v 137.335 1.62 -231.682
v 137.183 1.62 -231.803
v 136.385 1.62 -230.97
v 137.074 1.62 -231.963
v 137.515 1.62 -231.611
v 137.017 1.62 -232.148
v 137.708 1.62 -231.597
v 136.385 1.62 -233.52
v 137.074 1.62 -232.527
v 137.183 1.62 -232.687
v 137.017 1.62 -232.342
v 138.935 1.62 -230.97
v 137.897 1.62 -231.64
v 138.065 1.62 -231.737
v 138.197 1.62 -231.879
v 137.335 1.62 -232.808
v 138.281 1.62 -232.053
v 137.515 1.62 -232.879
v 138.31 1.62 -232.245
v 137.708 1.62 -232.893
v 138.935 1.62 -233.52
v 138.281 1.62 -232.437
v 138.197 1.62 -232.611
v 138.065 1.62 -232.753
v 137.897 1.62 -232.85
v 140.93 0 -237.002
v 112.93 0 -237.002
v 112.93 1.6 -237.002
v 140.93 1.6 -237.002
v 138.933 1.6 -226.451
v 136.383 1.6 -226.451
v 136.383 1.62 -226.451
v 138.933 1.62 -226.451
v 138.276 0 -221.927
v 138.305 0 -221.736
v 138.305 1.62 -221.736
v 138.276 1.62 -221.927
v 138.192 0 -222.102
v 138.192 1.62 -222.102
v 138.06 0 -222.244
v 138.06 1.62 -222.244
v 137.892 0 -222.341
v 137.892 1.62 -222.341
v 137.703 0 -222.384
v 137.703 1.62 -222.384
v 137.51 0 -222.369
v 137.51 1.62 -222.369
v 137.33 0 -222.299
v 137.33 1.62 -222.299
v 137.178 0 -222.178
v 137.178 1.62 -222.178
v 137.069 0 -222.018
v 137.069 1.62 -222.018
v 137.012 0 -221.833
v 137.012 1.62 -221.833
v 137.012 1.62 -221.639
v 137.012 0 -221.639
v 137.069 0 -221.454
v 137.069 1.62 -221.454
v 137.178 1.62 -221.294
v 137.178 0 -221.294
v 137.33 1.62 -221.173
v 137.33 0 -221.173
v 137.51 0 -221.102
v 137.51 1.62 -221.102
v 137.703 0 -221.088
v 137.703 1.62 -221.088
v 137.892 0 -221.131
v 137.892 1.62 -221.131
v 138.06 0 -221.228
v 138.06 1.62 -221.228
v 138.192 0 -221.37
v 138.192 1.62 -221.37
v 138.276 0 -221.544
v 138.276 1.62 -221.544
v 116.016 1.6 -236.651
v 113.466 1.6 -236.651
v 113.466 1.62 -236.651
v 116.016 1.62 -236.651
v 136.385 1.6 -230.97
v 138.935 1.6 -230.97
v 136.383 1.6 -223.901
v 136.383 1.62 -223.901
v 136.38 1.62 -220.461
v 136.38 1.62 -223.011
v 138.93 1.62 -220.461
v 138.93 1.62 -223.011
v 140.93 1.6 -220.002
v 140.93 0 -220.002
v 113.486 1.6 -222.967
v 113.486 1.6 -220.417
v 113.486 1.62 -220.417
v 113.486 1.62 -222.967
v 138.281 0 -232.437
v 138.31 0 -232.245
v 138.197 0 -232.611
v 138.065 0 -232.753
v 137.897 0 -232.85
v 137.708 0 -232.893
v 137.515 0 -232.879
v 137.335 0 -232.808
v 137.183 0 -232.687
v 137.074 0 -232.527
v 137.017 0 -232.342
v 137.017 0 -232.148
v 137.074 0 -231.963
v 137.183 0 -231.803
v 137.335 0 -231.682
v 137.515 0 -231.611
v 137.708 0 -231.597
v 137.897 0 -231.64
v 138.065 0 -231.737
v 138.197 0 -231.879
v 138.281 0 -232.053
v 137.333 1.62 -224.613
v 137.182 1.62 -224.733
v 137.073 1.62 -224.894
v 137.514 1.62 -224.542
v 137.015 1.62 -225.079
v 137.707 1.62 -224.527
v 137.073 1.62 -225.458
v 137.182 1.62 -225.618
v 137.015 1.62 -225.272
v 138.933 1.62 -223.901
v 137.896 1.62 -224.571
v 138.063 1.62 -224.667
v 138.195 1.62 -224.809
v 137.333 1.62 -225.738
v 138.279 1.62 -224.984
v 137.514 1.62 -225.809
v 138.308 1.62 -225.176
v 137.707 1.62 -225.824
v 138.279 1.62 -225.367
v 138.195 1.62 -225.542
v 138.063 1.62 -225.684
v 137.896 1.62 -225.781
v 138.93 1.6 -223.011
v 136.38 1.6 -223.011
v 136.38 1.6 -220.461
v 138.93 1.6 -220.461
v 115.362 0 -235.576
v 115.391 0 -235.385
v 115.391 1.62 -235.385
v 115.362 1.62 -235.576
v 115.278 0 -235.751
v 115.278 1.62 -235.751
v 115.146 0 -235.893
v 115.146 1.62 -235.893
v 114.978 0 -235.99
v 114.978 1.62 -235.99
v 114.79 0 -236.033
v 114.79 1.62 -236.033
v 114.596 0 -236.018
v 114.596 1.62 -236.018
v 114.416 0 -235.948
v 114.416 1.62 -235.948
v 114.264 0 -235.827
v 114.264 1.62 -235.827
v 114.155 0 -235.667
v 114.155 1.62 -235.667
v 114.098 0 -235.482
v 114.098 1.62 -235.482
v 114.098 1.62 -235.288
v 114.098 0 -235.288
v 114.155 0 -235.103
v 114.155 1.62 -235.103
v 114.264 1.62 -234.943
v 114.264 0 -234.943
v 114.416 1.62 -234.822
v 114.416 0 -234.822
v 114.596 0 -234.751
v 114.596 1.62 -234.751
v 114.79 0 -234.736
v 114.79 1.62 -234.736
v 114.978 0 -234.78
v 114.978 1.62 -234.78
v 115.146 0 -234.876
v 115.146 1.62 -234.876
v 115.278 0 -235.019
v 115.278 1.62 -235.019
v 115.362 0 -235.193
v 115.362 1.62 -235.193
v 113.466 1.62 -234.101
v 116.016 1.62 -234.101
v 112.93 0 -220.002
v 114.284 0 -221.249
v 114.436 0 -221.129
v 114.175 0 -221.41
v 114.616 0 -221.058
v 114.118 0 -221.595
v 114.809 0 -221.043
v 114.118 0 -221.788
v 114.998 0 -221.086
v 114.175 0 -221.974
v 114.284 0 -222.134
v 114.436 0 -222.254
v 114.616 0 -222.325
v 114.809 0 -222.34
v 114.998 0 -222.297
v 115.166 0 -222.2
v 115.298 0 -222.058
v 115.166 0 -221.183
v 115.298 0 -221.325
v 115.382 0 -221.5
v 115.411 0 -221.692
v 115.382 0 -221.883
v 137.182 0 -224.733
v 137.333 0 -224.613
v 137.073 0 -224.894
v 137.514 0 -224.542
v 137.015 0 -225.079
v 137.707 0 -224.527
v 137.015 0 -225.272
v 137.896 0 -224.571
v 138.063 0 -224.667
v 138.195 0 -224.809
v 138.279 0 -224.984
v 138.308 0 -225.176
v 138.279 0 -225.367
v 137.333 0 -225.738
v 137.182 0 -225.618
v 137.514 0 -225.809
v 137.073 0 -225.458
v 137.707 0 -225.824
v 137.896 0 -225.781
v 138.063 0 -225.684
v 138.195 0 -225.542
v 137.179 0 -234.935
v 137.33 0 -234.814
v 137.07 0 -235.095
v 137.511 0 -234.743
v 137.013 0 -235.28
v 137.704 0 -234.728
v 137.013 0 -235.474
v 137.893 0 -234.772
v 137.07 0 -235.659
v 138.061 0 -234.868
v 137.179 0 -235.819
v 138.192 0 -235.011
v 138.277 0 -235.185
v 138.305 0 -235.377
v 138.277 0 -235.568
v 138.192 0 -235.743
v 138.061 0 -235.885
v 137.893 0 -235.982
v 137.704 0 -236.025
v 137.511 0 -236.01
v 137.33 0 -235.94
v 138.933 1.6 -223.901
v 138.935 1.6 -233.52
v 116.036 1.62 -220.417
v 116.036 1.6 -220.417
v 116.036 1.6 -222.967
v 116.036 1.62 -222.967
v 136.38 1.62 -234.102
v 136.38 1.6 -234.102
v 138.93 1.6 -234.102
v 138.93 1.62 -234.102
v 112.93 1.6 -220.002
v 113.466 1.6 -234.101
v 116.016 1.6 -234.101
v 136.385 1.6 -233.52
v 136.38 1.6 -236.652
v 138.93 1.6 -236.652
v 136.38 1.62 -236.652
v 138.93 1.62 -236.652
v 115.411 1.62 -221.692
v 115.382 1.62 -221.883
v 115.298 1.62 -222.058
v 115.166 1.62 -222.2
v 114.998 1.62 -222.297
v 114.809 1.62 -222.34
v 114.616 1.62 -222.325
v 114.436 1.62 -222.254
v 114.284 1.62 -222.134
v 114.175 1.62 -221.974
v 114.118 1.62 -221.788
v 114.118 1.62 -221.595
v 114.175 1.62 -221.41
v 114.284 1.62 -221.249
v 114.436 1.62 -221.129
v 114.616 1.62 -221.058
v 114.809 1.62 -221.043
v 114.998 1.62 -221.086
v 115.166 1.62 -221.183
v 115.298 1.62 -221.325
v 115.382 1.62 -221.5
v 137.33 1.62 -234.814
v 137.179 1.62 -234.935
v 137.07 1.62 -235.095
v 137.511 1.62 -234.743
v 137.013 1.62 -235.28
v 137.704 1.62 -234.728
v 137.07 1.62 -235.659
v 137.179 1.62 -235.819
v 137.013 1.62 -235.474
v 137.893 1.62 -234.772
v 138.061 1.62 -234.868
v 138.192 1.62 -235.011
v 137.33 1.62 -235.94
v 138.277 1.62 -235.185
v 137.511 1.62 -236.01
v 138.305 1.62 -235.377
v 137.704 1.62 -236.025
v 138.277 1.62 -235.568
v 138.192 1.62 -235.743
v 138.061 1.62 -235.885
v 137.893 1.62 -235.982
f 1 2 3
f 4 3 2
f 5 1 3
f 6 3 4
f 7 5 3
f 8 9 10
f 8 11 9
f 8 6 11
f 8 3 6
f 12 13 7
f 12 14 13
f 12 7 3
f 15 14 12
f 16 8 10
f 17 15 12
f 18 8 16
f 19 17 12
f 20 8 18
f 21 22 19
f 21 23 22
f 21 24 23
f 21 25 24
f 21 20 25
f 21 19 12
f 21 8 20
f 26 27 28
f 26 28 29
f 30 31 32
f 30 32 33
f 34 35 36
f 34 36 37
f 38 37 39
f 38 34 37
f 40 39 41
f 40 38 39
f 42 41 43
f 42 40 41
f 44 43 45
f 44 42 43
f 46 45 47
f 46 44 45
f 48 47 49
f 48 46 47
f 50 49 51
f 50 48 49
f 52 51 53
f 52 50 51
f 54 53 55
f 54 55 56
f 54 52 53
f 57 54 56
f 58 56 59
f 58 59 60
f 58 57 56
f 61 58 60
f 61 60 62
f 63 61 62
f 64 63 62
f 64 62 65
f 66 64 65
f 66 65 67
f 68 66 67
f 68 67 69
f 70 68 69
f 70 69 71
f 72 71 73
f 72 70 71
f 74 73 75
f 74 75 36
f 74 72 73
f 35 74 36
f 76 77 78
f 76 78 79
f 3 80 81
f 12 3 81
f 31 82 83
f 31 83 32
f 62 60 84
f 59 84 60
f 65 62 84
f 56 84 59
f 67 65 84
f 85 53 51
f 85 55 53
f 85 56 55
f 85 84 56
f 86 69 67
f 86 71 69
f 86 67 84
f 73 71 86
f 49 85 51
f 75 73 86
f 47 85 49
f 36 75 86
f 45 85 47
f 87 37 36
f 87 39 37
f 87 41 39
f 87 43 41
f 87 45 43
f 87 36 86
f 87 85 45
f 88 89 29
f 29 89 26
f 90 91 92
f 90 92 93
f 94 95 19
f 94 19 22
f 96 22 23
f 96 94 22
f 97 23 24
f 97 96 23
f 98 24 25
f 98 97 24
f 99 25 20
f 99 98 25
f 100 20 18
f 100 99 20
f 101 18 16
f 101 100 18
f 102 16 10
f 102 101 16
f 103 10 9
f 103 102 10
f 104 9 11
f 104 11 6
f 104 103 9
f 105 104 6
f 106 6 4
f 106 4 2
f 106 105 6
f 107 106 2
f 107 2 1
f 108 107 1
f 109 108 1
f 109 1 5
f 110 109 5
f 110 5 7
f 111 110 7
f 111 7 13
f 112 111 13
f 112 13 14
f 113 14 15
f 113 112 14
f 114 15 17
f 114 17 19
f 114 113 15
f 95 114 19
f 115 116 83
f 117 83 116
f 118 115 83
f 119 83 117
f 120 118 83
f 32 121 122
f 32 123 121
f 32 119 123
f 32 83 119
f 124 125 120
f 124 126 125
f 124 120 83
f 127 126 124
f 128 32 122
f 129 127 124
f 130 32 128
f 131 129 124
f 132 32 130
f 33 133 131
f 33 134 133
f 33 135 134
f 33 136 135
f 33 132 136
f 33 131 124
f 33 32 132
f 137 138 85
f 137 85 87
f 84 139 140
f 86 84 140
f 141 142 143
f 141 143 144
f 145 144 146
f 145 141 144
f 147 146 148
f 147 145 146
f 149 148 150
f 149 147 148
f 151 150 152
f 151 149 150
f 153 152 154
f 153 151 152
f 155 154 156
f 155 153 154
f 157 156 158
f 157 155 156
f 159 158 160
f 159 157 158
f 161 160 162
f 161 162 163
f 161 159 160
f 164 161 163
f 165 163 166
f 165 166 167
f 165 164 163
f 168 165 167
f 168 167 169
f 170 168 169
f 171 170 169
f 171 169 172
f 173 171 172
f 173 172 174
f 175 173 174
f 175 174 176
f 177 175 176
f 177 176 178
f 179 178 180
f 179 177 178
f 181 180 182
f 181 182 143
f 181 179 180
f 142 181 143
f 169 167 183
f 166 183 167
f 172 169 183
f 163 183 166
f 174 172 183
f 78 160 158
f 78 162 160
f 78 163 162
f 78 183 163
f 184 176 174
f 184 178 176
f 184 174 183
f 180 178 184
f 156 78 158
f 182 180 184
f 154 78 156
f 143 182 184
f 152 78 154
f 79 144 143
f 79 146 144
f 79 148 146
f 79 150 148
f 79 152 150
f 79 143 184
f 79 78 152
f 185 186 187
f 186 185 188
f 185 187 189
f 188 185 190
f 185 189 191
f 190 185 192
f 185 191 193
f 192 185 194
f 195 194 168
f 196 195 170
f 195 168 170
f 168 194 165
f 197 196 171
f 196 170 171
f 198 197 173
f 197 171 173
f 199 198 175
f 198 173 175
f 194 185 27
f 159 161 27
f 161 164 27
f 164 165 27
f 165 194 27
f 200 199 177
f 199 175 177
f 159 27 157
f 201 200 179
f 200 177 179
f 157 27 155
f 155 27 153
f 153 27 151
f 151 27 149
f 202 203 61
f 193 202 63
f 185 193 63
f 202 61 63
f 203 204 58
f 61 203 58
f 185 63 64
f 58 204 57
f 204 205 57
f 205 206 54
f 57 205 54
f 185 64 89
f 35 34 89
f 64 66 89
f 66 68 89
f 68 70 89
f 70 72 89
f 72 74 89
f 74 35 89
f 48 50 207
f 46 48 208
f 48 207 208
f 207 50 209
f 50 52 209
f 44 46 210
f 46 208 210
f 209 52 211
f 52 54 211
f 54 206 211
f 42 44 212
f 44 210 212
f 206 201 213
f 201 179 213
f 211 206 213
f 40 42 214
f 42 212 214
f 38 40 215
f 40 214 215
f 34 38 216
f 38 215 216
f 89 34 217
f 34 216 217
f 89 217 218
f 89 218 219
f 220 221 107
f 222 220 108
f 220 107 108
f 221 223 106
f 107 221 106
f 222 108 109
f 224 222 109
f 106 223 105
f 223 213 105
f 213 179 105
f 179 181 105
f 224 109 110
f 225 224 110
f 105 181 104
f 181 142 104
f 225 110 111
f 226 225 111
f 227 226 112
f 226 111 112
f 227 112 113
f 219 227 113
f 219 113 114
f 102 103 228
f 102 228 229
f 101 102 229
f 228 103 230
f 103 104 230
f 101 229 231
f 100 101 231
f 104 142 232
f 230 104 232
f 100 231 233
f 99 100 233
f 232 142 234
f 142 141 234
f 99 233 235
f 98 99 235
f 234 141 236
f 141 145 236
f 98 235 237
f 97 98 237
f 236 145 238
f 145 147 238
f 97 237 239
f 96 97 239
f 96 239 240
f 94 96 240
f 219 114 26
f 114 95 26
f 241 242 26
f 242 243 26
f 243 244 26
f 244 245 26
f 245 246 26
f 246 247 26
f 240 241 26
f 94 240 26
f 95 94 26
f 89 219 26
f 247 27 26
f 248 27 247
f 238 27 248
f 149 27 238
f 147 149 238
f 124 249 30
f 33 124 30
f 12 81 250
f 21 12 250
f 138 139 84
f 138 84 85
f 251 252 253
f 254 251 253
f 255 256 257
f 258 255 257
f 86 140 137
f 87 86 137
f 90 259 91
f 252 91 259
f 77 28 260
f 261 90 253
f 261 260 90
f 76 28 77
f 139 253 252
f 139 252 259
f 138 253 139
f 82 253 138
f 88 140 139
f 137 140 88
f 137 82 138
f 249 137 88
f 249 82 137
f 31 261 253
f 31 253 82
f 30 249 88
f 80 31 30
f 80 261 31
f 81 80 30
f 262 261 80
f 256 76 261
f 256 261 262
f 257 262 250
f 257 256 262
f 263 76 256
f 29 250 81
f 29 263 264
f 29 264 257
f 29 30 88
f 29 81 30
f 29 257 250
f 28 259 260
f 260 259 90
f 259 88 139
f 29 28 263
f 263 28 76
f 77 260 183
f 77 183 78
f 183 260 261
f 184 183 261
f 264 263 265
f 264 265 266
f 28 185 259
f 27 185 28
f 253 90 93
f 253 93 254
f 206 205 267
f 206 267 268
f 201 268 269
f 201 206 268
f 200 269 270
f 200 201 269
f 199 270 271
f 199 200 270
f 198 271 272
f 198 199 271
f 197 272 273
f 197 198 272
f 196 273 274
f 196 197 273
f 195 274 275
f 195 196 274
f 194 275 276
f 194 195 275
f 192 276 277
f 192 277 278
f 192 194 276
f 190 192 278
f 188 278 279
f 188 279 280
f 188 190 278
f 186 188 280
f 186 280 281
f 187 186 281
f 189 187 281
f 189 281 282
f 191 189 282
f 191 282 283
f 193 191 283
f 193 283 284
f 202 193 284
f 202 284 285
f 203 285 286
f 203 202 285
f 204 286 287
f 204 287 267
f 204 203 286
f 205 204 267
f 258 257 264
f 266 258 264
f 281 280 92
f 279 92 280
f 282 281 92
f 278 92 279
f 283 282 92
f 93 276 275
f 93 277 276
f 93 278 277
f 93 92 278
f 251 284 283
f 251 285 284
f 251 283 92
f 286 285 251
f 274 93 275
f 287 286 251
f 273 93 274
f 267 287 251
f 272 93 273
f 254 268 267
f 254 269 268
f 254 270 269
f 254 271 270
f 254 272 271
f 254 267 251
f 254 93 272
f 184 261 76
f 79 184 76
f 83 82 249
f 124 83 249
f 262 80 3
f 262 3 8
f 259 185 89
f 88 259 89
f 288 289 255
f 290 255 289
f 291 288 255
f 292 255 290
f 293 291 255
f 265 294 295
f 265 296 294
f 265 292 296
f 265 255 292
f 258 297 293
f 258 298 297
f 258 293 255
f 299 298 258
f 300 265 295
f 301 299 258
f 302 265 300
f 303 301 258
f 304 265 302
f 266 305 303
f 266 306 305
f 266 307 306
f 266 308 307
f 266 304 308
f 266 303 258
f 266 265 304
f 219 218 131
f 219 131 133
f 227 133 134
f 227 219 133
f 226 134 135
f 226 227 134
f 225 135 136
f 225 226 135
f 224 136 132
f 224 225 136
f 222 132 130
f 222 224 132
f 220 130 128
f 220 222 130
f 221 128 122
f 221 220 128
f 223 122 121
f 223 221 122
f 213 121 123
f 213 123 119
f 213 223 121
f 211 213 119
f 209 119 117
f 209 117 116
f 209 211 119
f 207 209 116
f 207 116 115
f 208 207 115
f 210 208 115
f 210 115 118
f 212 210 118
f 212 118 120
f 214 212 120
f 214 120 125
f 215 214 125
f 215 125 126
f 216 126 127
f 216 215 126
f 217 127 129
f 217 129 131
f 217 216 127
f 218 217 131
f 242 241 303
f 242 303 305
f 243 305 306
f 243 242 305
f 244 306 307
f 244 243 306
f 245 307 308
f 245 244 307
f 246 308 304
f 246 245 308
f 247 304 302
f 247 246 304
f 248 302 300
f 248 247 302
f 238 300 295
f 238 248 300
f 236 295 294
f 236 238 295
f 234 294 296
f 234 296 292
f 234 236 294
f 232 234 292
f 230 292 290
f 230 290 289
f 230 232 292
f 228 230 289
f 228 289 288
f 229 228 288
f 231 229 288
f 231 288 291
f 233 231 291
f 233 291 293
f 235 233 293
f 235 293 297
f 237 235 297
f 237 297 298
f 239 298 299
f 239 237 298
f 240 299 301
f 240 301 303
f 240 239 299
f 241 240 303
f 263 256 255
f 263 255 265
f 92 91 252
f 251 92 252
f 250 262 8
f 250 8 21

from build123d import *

# Parameters (mm, degrees)
SKETCH1_W           = 28
SKETCH1_H           = 17
SKETCH1_W_2         = 2.55
SKETCH1_H_2         = 2.55
BOSS_EXTRUDE2_DEPTH = 1.6
SKETCH1_4_W         = 2.55
SKETCH1_4_H         = 2.55
SKETCH1_4_R         = 0.65
BOSS_EXTRUDE3_DEPTH = 1.62


with BuildPart() as part:
    # Sketch1 → Boss-Extrude2 (new body)
    with BuildSketch(Plane(origin=(0, 0, 0), x_dir=(1, 0, 0), z_dir=(0, 1, 0))):
        with Locations((126.930429576, 228.501666699)):
            Rectangle(SKETCH1_W, SKETCH1_H)
        with Locations((114.760575643, 221.691567702)):
            Rectangle(SKETCH1_W_2, SKETCH1_H_2, mode=Mode.SUBTRACT)
        with Locations((137.654571072, 221.735710918)):
            Rectangle(SKETCH1_W_2, SKETCH1_H_2, mode=Mode.SUBTRACT)
        with Locations((137.658202973, 225.175578697)):
            Rectangle(SKETCH1_W_2, SKETCH1_H_2, mode=Mode.SUBTRACT)
        with Locations((114.740971772, 235.375518488)):
            Rectangle(SKETCH1_W_2, SKETCH1_H_2, mode=Mode.SUBTRACT)
        with Locations((137.659563776, 232.245059936)):
            Rectangle(SKETCH1_W_2, SKETCH1_H_2, mode=Mode.SUBTRACT)
        with Locations((137.655429576, 235.376666699)):
            Rectangle(SKETCH1_W_2, SKETCH1_H_2, mode=Mode.SUBTRACT)
    extrude(amount=BOSS_EXTRUDE2_DEPTH)

    # Sketch1<4> → Boss-Extrude3 (add)
    # profile 1 of 6: a face of its own
    with BuildSketch(Plane(origin=(0, 0, 0), x_dir=(1, 0, 0), z_dir=(0, 1, 0))):
        with Locations((137.655429576, 235.376666699)):
            Rectangle(SKETCH1_4_W, SKETCH1_4_H)
        with Locations((137.655429576, 235.376666699)):
            Circle(SKETCH1_4_R, mode=Mode.SUBTRACT)
    # profile 2 of 6: a face of its own
    with BuildSketch(Plane(origin=(0, 0, 0), x_dir=(1, 0, 0), z_dir=(0, 1, 0))):
        with Locations((114.740971772, 235.375518488)):
            Rectangle(SKETCH1_4_W, SKETCH1_4_H)
        with Locations((114.740971772, 235.384673509)):
            Circle(SKETCH1_4_R, mode=Mode.SUBTRACT)
    # profile 3 of 6: a face of its own
    with BuildSketch(Plane(origin=(0, 0, 0), x_dir=(1, 0, 0), z_dir=(0, 1, 0))):
        with Locations((137.659563776, 232.245059936)):
            Rectangle(SKETCH1_4_W, SKETCH1_4_H)
        with Locations((137.659563776, 232.245059936)):
            Circle(SKETCH1_4_R, mode=Mode.SUBTRACT)
    # profile 4 of 6: a face of its own
    with BuildSketch(Plane(origin=(0, 0, 0), x_dir=(1, 0, 0), z_dir=(0, 1, 0))):
        with Locations((137.658202973, 225.175578697)):
            Rectangle(SKETCH1_4_W, SKETCH1_4_H)
        with Locations((137.658202973, 225.175578697)):
            Circle(SKETCH1_4_R, mode=Mode.SUBTRACT)
    # profile 5 of 6: a face of its own
    with BuildSketch(Plane(origin=(0, 0, 0), x_dir=(1, 0, 0), z_dir=(0, 1, 0))):
        with Locations((137.654571072, 221.735710918)):
            Rectangle(SKETCH1_4_W, SKETCH1_4_H)
        with Locations((137.654571072, 221.735710918)):
            Circle(SKETCH1_4_R, mode=Mode.SUBTRACT)
    # profile 6 of 6: a face of its own
    with BuildSketch(Plane(origin=(0, 0, 0), x_dir=(1, 0, 0), z_dir=(0, 1, 0))):
        with Locations((114.760575643, 221.691567702)):
            Rectangle(SKETCH1_4_W, SKETCH1_4_H)
        with Locations((114.760575643, 221.691567702)):
            Circle(SKETCH1_4_R, mode=Mode.SUBTRACT)
    extrude(amount=BOSS_EXTRUDE3_DEPTH)


solid = part.part
